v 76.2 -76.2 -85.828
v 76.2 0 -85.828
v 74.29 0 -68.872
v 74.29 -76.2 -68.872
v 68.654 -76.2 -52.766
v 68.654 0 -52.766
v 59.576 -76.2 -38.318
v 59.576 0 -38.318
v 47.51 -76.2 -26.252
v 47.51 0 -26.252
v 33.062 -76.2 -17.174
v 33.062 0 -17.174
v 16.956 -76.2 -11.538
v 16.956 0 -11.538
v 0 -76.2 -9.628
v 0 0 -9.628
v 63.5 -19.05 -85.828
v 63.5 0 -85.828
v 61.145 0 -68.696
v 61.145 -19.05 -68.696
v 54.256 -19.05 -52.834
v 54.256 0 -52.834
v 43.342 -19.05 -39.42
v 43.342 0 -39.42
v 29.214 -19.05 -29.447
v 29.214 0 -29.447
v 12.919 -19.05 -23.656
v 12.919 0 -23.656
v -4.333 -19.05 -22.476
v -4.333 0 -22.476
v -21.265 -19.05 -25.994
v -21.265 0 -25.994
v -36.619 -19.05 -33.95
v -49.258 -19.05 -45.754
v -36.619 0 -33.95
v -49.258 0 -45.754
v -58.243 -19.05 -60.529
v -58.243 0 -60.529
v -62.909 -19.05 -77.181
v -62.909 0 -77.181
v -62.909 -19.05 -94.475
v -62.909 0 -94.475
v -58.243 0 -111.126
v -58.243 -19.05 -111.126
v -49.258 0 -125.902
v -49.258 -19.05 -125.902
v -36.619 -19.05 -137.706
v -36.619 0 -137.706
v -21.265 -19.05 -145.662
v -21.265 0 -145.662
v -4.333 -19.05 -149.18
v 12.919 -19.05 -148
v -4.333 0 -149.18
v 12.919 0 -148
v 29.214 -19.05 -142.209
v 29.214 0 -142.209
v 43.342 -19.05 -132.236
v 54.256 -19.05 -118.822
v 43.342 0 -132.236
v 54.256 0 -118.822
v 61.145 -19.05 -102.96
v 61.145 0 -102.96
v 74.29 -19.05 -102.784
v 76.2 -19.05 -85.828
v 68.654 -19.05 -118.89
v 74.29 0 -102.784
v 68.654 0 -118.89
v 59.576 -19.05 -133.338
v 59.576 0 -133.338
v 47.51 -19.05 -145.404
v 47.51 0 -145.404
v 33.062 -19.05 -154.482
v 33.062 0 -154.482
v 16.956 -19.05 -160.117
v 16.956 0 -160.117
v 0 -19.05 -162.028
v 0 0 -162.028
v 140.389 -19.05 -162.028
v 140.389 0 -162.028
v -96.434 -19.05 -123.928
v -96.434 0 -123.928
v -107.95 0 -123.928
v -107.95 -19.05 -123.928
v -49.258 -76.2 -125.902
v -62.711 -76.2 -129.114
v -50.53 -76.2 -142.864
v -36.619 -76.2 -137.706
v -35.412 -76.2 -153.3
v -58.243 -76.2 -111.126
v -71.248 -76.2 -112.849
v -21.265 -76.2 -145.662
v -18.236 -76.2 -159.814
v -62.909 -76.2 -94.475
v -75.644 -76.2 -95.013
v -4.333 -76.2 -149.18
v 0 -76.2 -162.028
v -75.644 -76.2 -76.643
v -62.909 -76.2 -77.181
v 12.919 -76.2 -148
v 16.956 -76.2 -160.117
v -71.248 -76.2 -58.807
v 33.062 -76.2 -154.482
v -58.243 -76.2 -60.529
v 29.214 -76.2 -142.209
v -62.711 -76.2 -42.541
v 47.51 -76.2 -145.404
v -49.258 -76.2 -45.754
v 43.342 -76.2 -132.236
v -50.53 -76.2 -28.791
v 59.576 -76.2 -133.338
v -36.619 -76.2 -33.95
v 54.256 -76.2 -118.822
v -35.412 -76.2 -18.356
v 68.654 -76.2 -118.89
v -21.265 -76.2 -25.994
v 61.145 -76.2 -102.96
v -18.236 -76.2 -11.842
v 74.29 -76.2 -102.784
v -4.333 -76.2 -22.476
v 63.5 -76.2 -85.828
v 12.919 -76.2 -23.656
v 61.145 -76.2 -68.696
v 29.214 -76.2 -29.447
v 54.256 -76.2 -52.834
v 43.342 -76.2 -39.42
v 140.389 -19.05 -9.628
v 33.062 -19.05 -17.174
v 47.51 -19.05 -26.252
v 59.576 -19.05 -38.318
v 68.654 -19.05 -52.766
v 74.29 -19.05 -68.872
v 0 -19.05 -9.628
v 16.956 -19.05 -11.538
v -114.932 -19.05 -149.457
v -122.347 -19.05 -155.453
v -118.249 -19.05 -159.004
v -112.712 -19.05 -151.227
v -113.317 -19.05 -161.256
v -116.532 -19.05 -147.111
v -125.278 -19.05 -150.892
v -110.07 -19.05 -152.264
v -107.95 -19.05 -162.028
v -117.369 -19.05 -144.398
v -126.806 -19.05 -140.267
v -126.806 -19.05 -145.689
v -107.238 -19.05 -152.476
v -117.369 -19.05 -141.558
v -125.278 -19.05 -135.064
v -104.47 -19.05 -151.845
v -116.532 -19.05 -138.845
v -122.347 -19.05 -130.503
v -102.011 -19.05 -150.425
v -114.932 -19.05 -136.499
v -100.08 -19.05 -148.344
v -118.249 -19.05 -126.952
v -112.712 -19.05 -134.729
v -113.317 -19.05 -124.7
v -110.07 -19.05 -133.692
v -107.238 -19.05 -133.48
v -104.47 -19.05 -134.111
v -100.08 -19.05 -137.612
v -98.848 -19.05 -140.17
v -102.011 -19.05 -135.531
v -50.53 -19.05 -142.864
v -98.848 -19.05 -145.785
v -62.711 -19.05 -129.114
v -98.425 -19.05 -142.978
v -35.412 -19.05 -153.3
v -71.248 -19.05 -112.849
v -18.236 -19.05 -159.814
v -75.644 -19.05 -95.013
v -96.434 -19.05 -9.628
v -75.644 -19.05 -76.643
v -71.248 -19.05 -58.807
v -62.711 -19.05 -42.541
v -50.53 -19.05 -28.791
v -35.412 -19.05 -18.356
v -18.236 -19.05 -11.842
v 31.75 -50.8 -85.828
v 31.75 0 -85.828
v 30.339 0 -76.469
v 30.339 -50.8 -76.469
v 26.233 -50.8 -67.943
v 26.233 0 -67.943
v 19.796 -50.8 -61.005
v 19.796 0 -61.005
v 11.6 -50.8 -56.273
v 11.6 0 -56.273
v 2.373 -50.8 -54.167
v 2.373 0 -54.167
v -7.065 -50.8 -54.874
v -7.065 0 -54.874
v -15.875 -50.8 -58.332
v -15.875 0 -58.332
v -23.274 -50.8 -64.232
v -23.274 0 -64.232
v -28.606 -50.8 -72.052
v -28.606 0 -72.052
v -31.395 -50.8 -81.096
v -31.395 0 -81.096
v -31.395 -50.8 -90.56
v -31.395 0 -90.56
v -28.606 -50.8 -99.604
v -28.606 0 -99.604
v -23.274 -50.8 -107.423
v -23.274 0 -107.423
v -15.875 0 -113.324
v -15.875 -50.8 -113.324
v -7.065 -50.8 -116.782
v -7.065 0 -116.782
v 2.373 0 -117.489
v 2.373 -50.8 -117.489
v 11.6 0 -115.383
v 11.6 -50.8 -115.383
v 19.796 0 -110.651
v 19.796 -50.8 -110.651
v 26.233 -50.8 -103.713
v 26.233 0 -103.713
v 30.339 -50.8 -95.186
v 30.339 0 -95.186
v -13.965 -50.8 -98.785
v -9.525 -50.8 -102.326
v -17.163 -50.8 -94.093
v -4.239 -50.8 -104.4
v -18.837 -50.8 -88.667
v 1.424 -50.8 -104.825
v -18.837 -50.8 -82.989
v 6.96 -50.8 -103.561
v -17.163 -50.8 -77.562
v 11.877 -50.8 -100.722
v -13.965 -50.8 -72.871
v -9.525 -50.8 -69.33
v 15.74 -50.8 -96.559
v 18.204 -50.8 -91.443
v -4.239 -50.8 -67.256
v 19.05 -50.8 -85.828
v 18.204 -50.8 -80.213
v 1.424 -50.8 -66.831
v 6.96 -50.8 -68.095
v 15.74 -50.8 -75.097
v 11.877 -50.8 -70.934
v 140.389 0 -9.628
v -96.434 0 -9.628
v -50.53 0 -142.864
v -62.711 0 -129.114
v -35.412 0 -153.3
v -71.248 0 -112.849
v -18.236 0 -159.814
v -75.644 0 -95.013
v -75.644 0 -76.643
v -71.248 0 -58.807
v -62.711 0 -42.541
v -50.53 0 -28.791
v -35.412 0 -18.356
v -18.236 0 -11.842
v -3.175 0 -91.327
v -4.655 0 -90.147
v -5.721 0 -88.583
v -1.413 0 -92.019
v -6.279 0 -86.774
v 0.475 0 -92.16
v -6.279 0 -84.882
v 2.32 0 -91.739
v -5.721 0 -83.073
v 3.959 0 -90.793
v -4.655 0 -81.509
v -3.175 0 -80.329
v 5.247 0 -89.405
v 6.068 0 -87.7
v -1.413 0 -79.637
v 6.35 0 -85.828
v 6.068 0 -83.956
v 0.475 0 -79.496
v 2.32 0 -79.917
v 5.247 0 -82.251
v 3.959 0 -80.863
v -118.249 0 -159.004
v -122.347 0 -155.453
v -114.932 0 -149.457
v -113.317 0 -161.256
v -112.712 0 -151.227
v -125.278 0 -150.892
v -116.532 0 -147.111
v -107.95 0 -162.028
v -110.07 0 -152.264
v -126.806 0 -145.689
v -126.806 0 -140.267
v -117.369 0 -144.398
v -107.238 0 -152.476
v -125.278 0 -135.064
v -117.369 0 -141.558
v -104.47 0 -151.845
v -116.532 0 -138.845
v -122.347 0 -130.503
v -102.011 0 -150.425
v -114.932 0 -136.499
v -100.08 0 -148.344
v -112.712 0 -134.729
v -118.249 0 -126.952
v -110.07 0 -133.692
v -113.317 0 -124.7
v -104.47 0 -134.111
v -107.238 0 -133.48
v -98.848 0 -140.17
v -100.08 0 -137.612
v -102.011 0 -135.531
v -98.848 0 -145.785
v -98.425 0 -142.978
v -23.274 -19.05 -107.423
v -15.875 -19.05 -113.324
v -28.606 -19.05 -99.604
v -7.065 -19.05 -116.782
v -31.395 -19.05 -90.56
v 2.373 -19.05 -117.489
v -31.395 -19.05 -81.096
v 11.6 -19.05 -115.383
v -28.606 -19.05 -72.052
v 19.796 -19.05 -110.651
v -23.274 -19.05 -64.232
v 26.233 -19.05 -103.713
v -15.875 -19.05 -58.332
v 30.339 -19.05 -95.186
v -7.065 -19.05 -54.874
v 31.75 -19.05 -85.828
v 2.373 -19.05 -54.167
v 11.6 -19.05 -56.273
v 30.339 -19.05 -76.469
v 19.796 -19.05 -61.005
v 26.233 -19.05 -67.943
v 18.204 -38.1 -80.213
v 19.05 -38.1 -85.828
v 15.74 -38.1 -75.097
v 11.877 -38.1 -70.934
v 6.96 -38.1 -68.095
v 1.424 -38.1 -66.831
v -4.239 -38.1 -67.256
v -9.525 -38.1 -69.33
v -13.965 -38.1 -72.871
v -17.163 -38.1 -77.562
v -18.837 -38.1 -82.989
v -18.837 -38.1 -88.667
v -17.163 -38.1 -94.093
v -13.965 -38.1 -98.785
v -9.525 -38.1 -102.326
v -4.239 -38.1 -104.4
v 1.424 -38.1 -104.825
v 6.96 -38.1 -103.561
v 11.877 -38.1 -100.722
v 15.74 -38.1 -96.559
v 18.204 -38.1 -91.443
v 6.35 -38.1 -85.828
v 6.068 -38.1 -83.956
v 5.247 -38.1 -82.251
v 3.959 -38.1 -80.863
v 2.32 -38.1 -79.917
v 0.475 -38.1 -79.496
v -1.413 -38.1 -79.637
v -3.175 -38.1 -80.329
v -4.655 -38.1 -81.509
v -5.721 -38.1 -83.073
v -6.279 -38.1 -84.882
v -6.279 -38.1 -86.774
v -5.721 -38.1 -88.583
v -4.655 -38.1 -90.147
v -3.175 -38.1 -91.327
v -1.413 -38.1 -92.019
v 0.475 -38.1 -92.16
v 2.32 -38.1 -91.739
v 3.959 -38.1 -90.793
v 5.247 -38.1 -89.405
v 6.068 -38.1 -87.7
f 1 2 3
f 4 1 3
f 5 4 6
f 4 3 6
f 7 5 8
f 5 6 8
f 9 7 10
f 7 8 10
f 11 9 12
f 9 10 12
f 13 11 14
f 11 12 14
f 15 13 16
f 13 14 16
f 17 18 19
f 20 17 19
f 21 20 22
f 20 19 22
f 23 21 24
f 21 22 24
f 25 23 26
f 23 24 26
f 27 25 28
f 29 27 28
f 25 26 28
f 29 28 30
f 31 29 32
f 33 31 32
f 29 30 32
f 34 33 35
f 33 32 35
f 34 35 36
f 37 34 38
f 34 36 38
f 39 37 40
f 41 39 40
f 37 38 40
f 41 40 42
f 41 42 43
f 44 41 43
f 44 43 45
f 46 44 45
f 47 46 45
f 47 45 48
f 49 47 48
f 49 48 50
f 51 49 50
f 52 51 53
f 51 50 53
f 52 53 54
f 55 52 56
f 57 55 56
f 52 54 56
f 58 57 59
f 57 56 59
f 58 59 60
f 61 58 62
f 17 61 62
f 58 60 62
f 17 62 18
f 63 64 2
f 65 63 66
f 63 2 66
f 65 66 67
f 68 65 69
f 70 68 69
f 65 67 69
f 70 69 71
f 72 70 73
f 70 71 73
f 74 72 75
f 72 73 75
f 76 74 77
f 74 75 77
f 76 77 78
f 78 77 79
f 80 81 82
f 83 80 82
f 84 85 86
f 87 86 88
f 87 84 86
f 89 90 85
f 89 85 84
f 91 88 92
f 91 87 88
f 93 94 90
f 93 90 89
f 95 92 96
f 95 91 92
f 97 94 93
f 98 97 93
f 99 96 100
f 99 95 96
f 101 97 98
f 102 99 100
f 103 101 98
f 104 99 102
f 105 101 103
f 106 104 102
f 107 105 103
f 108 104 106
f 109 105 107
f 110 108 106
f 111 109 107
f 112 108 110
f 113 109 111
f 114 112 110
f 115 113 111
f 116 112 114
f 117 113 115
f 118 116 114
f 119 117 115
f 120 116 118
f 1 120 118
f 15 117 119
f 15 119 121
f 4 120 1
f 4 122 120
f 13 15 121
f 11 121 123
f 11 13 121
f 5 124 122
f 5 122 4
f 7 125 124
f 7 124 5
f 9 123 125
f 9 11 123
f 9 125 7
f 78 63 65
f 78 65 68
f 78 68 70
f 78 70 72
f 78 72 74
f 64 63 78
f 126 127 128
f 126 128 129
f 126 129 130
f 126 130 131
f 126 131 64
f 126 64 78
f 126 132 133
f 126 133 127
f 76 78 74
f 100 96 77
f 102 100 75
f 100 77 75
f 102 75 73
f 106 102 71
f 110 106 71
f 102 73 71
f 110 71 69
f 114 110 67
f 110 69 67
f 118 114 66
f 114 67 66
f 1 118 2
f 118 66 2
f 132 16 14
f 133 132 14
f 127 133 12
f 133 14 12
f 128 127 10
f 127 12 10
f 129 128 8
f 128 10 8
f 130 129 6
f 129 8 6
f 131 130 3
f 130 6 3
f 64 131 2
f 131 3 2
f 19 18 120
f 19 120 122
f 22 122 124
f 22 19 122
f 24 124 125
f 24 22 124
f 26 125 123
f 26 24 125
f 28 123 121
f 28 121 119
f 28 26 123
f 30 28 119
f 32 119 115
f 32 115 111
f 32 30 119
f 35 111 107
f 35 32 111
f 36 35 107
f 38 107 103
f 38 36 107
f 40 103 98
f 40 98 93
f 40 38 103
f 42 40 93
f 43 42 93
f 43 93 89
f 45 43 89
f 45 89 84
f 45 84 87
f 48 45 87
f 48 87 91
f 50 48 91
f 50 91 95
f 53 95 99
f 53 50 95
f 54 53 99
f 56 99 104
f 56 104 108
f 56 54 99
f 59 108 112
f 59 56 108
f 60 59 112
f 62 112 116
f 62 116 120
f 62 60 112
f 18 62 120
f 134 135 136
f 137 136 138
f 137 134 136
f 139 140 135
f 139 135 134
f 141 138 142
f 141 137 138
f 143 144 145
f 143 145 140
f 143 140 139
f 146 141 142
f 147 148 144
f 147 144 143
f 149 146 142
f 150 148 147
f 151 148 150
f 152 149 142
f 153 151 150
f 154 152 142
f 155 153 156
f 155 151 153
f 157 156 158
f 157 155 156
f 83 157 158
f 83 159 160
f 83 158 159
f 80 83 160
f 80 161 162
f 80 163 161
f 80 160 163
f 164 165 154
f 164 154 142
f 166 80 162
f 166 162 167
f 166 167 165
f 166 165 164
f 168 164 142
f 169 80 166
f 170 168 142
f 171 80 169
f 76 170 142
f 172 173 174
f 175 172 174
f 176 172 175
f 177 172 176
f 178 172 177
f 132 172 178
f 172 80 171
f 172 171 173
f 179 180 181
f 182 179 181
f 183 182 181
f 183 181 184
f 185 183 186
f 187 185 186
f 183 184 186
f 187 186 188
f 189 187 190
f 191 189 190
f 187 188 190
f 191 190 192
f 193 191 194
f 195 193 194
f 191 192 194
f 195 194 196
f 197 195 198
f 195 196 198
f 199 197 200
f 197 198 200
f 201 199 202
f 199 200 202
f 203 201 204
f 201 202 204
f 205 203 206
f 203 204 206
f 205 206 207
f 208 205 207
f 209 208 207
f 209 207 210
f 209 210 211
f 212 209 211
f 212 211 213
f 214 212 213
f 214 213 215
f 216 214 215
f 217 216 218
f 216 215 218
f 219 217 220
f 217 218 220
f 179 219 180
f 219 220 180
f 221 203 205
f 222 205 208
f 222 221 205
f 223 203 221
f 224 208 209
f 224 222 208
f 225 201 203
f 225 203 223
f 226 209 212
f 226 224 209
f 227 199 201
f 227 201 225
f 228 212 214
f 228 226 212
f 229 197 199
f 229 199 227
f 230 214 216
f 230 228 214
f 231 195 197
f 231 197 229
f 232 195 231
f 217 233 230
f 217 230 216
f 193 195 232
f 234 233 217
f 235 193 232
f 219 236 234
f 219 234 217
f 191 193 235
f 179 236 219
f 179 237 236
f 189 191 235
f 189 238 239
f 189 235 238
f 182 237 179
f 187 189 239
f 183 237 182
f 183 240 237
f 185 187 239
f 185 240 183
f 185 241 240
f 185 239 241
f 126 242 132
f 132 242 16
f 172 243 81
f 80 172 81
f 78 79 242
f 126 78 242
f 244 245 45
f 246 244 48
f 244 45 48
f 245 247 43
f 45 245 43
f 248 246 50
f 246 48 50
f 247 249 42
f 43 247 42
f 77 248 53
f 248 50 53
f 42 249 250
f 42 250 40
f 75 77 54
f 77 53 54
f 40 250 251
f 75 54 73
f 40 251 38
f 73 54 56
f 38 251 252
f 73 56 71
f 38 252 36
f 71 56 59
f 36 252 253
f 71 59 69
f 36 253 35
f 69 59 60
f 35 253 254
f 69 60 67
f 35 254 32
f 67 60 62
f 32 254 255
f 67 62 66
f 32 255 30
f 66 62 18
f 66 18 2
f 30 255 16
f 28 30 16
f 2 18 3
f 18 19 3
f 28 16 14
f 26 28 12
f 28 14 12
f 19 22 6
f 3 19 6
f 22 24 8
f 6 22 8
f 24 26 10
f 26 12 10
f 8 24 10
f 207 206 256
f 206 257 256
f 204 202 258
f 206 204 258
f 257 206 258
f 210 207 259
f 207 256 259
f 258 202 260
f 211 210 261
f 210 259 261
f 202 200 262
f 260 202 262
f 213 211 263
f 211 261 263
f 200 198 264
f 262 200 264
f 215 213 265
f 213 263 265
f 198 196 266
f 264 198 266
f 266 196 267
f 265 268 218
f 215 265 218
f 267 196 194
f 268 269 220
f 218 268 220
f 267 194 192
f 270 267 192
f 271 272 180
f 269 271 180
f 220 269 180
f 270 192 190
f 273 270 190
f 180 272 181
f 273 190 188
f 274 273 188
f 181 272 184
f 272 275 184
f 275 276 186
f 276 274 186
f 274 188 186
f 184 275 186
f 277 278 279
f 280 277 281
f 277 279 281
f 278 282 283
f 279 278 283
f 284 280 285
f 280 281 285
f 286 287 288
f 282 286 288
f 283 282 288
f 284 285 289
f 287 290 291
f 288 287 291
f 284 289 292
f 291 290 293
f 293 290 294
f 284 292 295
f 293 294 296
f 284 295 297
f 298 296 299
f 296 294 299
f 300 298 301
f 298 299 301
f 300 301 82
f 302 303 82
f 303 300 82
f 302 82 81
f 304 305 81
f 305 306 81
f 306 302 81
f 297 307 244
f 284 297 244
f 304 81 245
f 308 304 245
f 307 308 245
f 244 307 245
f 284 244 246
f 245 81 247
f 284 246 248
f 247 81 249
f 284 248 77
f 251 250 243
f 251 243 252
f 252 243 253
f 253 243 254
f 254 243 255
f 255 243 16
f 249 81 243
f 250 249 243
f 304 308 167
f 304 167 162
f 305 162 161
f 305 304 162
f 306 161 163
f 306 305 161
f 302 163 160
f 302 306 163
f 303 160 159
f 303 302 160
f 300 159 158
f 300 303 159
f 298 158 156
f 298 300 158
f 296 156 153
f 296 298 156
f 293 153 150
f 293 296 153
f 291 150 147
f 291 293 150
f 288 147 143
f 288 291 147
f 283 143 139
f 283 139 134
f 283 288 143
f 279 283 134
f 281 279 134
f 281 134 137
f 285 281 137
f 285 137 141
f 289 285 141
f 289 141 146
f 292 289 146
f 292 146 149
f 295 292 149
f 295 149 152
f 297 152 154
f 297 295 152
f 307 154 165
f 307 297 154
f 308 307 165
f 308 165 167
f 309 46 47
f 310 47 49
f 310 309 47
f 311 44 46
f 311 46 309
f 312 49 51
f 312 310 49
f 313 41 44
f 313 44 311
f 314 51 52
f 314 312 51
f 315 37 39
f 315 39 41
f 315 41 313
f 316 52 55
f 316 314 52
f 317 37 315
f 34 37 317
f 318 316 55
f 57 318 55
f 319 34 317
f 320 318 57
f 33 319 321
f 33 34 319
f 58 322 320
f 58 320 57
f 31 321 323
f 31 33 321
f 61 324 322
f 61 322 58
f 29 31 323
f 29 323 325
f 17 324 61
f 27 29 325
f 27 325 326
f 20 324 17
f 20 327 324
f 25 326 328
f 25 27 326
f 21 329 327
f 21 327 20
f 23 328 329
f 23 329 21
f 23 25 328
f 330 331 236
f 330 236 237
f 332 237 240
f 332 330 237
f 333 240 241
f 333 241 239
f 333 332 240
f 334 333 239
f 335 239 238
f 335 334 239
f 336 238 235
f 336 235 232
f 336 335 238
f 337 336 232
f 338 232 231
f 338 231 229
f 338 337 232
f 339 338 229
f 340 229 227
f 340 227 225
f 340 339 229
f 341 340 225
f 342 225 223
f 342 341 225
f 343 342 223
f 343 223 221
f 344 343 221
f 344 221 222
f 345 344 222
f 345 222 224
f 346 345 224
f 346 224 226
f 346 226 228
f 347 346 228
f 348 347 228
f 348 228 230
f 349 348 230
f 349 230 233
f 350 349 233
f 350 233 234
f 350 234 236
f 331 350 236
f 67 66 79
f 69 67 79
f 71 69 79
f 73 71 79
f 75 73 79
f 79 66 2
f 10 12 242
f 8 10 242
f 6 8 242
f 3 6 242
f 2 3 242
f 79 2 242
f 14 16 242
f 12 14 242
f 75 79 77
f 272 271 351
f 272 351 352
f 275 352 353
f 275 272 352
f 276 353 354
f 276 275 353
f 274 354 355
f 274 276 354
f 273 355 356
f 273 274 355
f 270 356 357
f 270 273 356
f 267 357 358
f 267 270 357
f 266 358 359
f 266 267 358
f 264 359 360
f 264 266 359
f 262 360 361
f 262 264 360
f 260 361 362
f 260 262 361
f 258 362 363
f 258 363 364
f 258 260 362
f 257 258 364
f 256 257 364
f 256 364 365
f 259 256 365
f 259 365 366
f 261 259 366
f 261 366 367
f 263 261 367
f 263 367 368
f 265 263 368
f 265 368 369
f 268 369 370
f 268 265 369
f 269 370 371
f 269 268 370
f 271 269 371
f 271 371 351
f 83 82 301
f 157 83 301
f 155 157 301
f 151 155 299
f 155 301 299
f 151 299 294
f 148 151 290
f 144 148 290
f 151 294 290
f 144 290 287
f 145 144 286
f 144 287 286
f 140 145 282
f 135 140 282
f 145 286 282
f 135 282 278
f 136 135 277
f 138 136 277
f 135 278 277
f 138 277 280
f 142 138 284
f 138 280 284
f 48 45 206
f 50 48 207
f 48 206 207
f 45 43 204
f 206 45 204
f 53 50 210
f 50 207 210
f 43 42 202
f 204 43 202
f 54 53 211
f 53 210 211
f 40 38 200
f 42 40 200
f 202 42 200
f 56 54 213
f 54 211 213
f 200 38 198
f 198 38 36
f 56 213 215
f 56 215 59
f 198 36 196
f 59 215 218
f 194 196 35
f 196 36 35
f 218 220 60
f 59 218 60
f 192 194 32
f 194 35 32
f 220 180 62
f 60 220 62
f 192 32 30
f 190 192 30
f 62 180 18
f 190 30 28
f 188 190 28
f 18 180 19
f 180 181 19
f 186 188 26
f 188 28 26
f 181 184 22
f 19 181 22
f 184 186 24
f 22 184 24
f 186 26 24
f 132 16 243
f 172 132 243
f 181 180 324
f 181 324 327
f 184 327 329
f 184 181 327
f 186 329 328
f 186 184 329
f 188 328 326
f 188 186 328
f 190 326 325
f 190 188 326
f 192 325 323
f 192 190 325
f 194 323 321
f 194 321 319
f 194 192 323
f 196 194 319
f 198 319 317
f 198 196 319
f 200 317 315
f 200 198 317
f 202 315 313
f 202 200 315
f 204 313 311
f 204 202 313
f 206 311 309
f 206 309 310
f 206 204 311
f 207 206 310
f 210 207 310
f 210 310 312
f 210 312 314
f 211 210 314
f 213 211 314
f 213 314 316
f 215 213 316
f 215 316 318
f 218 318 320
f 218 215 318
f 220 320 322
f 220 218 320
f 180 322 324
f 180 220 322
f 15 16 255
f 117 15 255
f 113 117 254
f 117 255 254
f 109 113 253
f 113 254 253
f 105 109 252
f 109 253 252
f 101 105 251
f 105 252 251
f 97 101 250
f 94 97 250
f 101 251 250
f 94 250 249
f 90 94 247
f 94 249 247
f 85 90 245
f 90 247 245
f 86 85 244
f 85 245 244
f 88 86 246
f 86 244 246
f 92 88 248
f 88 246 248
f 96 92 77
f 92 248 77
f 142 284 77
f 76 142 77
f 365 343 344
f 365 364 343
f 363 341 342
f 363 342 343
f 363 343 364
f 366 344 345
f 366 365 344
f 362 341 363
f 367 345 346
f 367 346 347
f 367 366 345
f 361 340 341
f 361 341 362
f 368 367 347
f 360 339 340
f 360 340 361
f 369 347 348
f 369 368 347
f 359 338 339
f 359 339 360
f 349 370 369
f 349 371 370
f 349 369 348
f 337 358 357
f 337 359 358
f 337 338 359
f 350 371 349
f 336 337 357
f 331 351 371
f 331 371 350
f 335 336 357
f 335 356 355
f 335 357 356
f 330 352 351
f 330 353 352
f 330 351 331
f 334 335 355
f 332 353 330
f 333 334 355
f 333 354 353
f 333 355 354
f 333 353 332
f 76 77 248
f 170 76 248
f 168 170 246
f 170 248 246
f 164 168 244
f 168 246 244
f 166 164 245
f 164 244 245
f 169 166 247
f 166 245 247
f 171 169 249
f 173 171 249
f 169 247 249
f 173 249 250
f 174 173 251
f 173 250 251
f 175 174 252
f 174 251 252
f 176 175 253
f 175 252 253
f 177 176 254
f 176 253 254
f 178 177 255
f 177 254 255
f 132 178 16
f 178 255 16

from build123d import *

# Parameters (mm, degrees)
F0_R     = 9.525
F0_R_2   = 63.5
F0_R_3   = 31.75
F1_DEPTH = 19.05
F2_DEPTH = 76.2
F0_R_4   = 19.05
F3_DEPTH = 50.8
F0_R_5   = 6.35
F4_DEPTH = 38.1


with BuildPart() as f1:
    # F0 (on Front) → F1 (new body)
    with BuildSketch(Plane.XZ):
        with BuildLine():
            Line((140.389087, -9.627948), (0, -9.627948))
            ThreePointArc((0, -9.627948), (53.881537, -31.946411), (76.2, -85.827948))
            ThreePointArc((76.2, -85.827948), (53.881537, -139.709484), (0, -162.027948))
            Line((0, -162.027948), (140.389087, -162.027948))
            Line((140.389087, -162.027948), (140.389087, -123.927948))
            Line((140.389087, -123.927948), (140.389087, -30.55766))
            Line((140.389087, -30.55766), (140.389087, -9.627948))
        make_face()
        with BuildLine():
            Line((0, -9.627948), (-96.434117, -9.627948))
            Line((-96.434117, -9.627948), (-96.434117, -37.627392))
            Line((-96.434117, -37.627392), (-96.434117, -123.927948))
            Line((-96.434117, -123.927948), (-96.434117, -162.027948))
            Line((-96.434117, -162.027948), (0, -162.027948))
            ThreePointArc((0, -162.027948), (-76.2, -85.827948), (0, -9.627948))
        make_face()
        with BuildLine():
            Line((-96.434117, -162.027948), (-96.434117, -123.927948))
            Line((-96.434117, -123.927948), (-107.95, -123.927948))
            ThreePointArc((-107.95, -123.927948), (-127, -142.977948), (-107.95, -162.027948))
            Line((-107.95, -162.027948), (-96.434117, -162.027948))
        make_face()
        with Locations((-107.95, -142.977948)):
            Circle(F0_R, mode=Mode.SUBTRACT)
        with Locations((0, -85.827948)):
            Circle(F0_R_2)
        with Locations((0, -85.827948)):
            Circle(F0_R_3, mode=Mode.SUBTRACT)
    extrude(amount=F1_DEPTH)


with BuildPart() as f2:
    # F0 (on Front) → F2 (new body)
    with BuildSketch(Plane.XZ):
        with BuildLine():
            ThreePointArc((76.2, -85.827948), (53.881537, -31.946411), (0, -9.627948))
            ThreePointArc((0, -9.627948), (-76.2, -85.827948), (0, -162.027948))
            ThreePointArc((0, -162.027948), (53.881537, -139.709484), (76.2, -85.827948))
        make_face()
        with Locations((0, -85.827948)):
            Circle(F0_R_2, mode=Mode.SUBTRACT)
    extrude(amount=F2_DEPTH)


with BuildPart() as f3:
    # F0 (on Front) → F3 (new body)
    with BuildSketch(Plane.XZ):
        with Locations((0, -85.827948)):
            Circle(F0_R_3)
        with Locations((0, -85.827948)):
            Circle(F0_R_4, mode=Mode.SUBTRACT)
    extrude(amount=F3_DEPTH)

    # F0 (on Front) → F4 (join)
    with BuildSketch(Plane.XZ):
        with Locations((0, -85.827948)):
            Circle(F0_R_4)
        with Locations((0, -85.827948)):
            Circle(F0_R_5, mode=Mode.SUBTRACT)
    extrude(amount=F4_DEPTH)


solid = Compound([f1.part, f2.part, f3.part])
